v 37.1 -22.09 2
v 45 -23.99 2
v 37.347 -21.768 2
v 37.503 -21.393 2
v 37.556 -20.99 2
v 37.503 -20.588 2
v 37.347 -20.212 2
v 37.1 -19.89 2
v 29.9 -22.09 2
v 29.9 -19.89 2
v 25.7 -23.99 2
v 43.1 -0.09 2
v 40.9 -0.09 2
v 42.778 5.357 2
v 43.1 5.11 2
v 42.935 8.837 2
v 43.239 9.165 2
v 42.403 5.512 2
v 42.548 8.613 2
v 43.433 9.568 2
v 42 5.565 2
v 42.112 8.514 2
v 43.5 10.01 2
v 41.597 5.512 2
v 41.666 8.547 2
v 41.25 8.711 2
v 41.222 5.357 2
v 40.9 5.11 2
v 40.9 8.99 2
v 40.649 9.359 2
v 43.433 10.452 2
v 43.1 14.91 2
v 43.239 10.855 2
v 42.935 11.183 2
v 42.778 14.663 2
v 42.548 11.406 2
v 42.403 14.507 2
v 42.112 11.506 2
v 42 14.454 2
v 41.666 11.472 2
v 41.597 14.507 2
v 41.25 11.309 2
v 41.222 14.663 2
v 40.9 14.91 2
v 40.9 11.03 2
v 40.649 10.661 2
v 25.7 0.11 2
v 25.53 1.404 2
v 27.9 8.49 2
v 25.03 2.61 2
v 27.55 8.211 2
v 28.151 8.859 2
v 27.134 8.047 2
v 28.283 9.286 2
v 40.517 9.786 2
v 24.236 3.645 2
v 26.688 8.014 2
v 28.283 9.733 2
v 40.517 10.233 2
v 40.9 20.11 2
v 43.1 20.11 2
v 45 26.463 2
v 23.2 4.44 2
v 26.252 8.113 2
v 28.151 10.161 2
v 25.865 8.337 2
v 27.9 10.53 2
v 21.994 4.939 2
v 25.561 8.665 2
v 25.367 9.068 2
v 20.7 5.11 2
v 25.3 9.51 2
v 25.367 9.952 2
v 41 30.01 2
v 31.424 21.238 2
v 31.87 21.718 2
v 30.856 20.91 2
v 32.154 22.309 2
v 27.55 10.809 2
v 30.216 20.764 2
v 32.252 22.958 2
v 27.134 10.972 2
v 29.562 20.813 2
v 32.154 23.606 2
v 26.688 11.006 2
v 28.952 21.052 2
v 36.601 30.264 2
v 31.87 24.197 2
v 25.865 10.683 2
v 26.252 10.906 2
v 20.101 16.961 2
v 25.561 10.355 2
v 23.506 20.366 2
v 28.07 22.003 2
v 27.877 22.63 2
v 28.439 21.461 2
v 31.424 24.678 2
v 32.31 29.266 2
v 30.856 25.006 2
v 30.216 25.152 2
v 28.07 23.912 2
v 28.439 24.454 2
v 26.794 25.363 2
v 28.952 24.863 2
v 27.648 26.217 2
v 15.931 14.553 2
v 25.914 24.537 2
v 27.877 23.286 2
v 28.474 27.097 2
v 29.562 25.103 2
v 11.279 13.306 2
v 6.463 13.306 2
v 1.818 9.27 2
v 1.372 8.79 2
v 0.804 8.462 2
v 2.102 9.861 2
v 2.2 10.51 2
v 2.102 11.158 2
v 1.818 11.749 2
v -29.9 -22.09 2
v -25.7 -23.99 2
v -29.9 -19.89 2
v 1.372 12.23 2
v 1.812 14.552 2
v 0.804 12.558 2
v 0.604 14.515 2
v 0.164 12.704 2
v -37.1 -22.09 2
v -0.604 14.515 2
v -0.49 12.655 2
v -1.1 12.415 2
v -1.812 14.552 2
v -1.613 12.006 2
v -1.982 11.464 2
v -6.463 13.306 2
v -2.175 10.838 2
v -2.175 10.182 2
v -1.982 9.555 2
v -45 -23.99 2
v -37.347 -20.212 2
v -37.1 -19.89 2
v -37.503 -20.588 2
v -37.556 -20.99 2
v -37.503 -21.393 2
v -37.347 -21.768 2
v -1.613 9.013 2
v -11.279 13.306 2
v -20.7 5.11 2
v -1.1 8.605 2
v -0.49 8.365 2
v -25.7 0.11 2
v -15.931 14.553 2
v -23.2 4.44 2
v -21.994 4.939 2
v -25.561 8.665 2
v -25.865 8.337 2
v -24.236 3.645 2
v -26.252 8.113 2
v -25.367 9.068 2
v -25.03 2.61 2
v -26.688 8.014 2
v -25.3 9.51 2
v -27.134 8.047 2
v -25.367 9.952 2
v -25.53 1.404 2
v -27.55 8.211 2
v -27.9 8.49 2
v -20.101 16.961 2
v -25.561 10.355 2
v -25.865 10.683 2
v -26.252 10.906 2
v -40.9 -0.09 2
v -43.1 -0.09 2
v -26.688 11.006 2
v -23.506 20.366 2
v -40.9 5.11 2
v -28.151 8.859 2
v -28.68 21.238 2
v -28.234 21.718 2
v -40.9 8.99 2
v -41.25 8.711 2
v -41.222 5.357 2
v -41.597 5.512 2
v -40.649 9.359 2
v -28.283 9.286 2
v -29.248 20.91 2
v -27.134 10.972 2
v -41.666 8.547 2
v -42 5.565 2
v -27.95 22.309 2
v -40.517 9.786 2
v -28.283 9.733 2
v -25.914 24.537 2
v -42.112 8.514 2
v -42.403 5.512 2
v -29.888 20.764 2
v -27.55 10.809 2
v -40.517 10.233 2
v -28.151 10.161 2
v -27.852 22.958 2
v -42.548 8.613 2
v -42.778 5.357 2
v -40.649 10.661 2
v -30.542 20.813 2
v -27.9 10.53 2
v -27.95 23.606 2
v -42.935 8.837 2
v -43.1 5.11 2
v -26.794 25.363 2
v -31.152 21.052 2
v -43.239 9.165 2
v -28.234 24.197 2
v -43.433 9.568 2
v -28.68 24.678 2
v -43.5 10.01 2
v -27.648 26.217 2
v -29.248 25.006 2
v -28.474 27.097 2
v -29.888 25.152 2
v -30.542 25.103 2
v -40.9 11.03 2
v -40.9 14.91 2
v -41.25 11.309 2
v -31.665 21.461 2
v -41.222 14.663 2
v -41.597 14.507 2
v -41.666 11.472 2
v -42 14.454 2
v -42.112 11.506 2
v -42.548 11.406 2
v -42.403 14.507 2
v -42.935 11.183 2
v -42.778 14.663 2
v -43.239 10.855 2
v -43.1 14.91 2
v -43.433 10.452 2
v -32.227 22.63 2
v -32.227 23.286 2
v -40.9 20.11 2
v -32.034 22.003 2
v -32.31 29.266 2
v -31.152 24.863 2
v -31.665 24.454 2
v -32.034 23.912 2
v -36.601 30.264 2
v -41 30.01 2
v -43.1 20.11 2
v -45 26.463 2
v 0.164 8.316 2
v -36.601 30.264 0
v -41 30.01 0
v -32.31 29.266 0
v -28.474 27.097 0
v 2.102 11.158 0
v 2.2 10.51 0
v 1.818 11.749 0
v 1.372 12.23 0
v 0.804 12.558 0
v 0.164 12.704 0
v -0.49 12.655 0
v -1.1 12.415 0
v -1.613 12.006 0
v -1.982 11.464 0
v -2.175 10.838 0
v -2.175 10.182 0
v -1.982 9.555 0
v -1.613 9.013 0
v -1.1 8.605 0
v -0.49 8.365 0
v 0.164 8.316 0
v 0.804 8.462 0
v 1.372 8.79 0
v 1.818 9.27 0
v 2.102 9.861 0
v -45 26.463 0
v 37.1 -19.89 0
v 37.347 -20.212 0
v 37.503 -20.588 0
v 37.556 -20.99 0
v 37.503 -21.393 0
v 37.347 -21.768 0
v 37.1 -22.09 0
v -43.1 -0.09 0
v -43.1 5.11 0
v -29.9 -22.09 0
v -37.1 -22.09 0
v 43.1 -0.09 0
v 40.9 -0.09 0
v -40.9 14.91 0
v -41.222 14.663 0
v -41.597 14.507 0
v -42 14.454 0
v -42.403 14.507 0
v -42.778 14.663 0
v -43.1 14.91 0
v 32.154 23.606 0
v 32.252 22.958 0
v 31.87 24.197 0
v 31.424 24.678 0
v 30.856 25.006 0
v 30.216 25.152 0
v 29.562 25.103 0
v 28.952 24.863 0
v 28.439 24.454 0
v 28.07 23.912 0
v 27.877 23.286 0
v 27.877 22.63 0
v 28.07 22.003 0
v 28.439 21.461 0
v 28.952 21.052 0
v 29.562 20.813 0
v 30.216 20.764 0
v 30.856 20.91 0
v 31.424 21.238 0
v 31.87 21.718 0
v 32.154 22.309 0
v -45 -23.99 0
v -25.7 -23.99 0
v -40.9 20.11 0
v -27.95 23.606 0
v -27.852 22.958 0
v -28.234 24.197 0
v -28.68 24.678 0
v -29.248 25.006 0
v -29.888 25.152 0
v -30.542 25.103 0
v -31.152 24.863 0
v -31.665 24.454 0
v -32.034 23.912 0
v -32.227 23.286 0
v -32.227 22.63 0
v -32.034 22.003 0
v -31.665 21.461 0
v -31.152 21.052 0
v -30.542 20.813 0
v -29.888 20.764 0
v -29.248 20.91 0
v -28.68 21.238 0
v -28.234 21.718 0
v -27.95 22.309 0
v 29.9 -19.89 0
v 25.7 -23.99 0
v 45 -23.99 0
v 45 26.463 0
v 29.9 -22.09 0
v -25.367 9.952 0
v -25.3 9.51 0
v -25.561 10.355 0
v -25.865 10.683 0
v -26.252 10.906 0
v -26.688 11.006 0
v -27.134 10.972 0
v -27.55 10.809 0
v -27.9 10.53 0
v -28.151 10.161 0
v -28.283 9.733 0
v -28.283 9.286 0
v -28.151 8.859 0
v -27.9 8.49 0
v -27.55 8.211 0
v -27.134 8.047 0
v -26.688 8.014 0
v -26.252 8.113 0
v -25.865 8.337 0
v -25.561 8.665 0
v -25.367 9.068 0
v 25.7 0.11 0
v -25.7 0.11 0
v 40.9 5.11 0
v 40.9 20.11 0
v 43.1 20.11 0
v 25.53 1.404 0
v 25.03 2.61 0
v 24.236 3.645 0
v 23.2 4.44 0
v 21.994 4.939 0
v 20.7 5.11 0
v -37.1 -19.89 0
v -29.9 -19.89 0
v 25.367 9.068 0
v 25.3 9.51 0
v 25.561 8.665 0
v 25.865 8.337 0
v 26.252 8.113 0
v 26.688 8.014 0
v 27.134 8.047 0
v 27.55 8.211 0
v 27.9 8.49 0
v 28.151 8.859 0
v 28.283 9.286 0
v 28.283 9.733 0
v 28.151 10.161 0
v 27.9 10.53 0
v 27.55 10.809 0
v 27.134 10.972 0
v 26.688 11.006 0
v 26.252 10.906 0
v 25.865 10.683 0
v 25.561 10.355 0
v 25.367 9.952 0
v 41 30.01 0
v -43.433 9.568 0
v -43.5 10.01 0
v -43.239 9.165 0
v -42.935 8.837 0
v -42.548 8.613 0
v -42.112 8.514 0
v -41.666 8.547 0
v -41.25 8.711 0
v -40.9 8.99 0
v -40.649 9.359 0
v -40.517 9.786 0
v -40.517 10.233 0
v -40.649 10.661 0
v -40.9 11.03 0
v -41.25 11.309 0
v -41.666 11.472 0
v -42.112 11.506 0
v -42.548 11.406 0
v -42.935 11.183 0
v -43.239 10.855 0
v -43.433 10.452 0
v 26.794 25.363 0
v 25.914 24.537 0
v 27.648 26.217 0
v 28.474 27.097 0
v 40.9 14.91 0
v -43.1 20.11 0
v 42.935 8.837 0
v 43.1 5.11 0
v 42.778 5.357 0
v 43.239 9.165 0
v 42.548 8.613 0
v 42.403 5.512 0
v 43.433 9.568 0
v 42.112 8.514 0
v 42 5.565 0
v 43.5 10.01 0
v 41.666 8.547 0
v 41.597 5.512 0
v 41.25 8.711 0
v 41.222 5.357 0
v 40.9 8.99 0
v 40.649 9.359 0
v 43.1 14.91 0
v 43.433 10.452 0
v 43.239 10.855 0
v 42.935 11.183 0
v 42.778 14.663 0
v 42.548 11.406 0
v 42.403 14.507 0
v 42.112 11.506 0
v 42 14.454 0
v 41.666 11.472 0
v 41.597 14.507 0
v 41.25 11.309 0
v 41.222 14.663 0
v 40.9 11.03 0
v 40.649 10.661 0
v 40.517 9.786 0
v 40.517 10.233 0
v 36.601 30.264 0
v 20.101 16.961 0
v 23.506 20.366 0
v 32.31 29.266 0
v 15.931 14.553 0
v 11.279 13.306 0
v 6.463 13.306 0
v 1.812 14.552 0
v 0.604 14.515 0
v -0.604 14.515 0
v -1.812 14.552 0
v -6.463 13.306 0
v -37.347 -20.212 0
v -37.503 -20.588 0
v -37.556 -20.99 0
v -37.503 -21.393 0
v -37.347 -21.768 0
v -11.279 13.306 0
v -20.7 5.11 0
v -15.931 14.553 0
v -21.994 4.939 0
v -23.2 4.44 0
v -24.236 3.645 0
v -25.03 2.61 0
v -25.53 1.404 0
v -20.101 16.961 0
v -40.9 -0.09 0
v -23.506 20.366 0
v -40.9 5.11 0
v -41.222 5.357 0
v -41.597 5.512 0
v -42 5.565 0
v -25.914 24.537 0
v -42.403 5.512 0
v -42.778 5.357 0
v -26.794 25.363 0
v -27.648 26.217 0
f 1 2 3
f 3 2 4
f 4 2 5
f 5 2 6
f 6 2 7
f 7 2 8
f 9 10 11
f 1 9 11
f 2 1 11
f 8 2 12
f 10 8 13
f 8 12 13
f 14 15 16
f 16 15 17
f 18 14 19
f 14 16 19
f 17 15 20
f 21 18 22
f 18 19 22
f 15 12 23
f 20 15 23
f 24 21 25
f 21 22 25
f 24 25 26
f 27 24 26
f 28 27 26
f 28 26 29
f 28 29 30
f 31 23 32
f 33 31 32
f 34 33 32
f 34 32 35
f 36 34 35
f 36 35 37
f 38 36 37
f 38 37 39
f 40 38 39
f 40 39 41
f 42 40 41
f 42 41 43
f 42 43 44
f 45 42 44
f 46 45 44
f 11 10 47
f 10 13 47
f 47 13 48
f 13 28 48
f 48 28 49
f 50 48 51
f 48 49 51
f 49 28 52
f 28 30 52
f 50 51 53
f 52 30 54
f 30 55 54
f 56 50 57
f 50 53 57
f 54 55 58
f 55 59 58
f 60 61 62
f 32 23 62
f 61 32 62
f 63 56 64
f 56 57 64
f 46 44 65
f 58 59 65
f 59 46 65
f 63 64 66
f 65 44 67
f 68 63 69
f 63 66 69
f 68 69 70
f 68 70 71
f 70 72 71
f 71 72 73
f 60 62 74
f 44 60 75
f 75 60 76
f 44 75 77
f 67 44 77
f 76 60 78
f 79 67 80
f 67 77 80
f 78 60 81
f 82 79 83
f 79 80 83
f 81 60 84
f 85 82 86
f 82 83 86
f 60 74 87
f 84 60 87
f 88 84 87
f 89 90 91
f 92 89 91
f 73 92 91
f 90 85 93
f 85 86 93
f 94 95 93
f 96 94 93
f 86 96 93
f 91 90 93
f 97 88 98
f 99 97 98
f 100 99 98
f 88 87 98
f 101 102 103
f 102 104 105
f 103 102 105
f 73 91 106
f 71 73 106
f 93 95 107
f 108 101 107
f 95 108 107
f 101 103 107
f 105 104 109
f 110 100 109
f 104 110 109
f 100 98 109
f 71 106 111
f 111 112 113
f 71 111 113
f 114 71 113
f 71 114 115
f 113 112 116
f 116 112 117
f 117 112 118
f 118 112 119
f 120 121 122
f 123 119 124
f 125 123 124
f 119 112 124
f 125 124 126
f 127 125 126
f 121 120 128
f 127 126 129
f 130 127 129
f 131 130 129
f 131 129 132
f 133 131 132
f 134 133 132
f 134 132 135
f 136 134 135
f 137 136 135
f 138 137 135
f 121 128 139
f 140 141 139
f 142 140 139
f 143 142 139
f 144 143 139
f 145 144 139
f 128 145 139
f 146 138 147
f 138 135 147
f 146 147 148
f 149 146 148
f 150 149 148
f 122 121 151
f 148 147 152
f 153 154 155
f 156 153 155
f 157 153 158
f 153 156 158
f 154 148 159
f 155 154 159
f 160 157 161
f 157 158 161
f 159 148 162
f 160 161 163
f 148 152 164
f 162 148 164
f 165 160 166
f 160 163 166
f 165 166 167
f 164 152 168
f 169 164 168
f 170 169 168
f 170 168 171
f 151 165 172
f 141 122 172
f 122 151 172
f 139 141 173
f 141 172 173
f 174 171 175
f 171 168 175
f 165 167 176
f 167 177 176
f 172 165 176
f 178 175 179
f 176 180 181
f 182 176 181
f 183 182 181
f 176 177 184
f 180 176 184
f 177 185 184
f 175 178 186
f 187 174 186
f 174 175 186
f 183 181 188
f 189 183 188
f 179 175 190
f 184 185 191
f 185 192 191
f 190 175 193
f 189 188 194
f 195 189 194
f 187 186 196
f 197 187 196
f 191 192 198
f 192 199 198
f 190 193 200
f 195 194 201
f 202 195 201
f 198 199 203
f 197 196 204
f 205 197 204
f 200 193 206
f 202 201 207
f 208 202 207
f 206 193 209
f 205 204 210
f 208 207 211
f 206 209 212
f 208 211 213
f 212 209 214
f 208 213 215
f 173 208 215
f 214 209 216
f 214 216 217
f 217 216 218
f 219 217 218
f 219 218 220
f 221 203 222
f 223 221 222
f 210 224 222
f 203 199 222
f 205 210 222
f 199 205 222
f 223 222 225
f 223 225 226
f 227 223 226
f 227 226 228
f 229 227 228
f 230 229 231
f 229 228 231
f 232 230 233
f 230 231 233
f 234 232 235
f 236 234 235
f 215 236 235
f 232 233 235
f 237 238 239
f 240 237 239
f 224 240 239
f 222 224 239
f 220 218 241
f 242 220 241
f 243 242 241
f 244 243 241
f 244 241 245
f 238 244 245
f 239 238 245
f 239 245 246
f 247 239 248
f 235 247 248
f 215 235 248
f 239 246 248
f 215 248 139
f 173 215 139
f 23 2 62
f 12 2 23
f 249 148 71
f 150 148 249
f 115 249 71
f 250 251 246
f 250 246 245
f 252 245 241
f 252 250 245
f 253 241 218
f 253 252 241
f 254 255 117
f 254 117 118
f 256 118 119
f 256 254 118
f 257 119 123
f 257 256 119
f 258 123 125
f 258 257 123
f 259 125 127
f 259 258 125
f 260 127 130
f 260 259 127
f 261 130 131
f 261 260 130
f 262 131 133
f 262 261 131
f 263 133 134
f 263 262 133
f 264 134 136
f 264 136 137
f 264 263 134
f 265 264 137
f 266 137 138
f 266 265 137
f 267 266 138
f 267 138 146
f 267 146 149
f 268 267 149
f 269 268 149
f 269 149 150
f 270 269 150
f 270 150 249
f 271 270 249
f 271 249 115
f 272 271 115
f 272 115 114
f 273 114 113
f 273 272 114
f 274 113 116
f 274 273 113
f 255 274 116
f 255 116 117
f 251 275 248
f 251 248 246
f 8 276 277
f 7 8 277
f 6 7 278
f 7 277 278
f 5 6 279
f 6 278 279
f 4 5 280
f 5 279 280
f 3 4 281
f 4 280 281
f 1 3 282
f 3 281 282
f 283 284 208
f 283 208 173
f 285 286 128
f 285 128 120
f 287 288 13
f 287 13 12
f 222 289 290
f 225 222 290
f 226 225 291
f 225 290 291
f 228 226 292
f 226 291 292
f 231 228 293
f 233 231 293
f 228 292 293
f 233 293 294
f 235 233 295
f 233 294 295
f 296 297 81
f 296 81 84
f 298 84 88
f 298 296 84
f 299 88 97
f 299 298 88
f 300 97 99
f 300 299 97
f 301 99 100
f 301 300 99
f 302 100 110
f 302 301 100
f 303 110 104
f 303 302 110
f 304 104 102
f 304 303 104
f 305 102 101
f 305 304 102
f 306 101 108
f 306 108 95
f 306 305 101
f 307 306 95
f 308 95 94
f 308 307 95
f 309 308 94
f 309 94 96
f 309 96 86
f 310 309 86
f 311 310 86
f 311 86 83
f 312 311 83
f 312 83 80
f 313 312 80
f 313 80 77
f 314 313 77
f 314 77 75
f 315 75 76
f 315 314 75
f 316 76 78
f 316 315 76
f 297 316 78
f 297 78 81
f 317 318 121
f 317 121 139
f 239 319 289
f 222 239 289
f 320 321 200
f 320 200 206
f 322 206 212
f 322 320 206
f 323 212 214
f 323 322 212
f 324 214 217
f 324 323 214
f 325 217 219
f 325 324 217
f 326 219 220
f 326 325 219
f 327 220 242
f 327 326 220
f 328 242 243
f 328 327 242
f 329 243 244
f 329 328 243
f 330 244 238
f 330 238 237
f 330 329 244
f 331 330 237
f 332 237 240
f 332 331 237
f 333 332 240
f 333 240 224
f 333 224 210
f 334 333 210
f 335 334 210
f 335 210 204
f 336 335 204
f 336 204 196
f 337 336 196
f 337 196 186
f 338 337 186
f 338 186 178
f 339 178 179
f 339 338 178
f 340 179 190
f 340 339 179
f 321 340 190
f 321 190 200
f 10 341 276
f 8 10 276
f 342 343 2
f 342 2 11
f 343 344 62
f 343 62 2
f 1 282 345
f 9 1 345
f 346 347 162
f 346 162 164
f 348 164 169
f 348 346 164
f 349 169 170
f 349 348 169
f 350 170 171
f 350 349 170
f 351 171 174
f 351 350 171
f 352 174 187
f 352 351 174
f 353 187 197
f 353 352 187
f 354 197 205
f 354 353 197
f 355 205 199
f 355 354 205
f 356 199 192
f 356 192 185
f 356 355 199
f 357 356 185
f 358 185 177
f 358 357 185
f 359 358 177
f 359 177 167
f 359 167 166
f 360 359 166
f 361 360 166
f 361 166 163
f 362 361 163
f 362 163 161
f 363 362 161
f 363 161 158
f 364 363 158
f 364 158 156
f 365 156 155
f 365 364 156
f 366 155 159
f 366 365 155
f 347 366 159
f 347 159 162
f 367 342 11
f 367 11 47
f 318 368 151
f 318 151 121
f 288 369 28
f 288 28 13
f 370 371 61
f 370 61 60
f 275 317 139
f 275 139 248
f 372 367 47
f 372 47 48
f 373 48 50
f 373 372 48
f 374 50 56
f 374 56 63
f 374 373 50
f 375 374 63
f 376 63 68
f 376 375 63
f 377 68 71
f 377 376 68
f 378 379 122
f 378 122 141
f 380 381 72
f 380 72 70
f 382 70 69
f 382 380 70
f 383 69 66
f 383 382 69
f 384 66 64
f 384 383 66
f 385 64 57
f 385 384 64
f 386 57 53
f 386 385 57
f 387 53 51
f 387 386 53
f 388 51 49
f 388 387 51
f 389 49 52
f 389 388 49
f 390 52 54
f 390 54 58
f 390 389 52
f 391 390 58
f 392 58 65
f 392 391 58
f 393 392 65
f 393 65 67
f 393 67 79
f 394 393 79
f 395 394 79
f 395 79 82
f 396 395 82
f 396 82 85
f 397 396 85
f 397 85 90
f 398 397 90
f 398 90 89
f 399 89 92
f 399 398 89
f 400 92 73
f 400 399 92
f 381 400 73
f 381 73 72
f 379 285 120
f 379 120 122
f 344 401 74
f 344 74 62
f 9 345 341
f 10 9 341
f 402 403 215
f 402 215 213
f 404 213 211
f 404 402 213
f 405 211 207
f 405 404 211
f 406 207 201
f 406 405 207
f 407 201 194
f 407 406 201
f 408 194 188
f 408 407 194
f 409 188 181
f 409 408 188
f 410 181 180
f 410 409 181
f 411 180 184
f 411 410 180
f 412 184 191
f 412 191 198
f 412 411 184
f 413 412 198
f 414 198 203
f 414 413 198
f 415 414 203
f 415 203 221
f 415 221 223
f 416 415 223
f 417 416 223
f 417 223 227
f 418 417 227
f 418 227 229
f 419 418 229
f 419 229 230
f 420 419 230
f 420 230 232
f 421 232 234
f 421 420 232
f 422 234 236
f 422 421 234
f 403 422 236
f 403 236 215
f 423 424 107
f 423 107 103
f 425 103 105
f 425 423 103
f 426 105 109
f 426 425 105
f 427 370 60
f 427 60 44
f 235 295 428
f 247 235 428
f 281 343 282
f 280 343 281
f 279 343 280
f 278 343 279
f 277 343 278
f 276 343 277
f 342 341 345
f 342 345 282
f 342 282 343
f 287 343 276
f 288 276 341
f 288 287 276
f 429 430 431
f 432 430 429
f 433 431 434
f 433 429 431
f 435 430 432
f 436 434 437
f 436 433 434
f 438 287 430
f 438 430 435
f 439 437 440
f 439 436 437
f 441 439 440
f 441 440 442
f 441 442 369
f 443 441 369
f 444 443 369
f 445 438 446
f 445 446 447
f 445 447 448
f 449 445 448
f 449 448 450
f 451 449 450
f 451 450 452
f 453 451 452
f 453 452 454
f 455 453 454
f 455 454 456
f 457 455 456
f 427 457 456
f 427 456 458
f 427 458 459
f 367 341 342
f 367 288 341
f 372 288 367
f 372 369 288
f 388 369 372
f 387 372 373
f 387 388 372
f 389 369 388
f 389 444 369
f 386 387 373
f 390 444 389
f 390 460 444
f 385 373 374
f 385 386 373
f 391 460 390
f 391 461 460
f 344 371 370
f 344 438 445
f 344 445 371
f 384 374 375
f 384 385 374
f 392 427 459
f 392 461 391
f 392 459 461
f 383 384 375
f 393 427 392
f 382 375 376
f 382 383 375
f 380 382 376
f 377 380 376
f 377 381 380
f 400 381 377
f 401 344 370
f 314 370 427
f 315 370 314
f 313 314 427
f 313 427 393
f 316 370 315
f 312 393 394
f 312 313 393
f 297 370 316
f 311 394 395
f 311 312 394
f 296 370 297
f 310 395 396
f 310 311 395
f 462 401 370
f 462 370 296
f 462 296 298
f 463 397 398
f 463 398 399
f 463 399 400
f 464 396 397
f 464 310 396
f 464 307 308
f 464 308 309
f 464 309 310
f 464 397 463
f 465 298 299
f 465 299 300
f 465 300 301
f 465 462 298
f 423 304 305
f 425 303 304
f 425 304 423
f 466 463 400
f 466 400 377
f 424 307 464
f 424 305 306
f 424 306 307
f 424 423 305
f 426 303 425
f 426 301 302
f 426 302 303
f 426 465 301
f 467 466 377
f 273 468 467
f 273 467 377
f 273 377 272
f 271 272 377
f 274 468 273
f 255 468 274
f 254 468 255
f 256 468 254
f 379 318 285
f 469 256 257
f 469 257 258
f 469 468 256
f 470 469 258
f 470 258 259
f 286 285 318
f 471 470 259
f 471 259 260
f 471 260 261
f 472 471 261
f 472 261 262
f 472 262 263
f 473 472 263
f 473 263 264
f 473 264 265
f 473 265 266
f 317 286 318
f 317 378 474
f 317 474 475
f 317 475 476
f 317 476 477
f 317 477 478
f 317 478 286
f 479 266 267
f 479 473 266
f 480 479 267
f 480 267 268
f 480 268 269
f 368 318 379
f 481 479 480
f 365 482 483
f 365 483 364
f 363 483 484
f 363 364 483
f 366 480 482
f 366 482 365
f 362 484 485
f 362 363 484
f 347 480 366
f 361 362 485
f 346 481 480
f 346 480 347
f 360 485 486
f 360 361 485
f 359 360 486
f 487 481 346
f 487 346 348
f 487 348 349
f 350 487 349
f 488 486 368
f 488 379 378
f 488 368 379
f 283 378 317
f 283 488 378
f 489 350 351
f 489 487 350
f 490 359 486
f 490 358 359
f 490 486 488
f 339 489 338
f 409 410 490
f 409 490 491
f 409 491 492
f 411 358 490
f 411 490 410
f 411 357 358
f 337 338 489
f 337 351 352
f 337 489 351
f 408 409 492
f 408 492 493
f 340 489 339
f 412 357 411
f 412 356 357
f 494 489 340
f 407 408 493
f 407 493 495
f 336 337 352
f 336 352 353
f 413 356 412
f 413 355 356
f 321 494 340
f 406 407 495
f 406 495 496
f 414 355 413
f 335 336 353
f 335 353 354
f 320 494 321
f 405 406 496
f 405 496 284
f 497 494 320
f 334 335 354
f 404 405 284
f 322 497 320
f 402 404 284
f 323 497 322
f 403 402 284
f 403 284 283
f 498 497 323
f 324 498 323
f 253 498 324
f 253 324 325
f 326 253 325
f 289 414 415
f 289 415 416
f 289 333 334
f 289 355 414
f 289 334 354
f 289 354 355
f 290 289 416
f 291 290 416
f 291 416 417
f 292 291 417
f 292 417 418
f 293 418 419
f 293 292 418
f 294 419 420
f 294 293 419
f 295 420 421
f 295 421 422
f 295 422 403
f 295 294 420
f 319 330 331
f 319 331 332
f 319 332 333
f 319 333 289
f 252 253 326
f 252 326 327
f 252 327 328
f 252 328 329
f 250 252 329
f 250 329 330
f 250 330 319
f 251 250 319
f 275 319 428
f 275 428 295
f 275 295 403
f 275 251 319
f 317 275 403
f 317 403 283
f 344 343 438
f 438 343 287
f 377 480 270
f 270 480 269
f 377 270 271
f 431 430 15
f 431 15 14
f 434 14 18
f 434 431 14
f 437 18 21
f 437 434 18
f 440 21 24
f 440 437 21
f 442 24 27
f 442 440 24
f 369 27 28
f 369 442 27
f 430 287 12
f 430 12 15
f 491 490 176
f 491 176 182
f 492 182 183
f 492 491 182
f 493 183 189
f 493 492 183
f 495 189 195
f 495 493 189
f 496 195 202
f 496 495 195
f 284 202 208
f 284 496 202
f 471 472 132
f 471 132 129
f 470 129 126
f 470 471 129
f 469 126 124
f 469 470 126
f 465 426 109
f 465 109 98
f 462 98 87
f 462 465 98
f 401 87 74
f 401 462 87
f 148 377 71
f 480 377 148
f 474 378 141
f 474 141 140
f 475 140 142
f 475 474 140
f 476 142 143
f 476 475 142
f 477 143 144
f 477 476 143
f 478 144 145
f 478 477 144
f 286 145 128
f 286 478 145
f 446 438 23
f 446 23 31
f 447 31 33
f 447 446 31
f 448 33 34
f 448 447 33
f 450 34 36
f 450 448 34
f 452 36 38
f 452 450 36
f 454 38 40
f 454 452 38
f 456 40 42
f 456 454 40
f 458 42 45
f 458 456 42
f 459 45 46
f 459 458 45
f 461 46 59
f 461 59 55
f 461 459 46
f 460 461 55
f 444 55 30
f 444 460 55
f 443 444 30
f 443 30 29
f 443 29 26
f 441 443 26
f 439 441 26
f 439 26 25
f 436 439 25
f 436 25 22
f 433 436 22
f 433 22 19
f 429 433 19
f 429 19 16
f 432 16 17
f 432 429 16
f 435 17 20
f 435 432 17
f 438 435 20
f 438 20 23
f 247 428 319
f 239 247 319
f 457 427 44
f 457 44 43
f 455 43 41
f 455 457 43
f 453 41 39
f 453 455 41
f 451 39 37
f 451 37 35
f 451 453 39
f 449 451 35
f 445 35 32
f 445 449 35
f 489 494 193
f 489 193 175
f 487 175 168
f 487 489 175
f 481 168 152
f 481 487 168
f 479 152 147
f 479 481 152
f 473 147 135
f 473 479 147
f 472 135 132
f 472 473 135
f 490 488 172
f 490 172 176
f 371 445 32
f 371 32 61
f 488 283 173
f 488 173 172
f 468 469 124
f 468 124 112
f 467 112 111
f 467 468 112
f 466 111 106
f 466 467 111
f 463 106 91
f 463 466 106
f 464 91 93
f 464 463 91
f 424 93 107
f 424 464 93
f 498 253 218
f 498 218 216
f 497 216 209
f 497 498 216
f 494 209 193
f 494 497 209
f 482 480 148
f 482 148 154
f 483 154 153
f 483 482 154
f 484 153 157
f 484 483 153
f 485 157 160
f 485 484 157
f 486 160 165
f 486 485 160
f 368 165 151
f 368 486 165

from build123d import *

# Parameters (mm, degrees)
SKETCH_3_R      = 2.2
SKETCH_3_R_2    = 1.5
EXTRUDE_1_DEPTH = 2


with BuildPart() as part:
    # 草图3 → 凸台-拉伸1 (new body)
    with BuildSketch(Plane.XY):
        with BuildLine():
            Line((-41, -23.990216685), (-42, -23.990216685))
            Line((-42, -23.990216685), (-44, -23.990216685))
            Line((-44, -23.990216685), (-45, -23.990216685))
            Line((-45, -23.990216685), (-45, 5.009783315))
            Line((-45, 5.009783315), (-45, 15.009783315))
            Line((-45, 15.009783315), (-45, 26.463053661))
            Line((-45, 26.463053661), (-41, 30.009783315))
            ThreePointArc((-41, 30.009783315), (-34.419700625, 29.918417102), (-28.474223323, 27.097072158))
            ThreePointArc((-28.474223323, 27.097072158), (-27.224142294, 25.7867036), (-25.913822519, 24.536571436))
            ThreePointArc((-25.913822519, 24.536571436), (-15.930575575, 14.55280442), (-1.811764604, 14.552436852))
            ThreePointArc((-1.811764604, 14.552436852), (0, 14.509783471), (1.811764604, 14.552436852))
            ThreePointArc((1.811764604, 14.552436852), (15.930575575, 14.55280442), (25.913822519, 24.536571436))
            ThreePointArc((25.913822519, 24.536571436), (27.224142294, 25.7867036), (28.474223323, 27.097072158))
            ThreePointArc((28.474223323, 27.097072158), (34.419700625, 29.918417102), (41, 30.009783315))
            Line((41, 30.009783315), (45, 26.463053661))
            Line((45, 26.463053661), (45, 15.009783315))
            Line((45, 15.009783315), (45, -23.990216685))
            Line((45, -23.990216685), (41, -23.990216685))
            Line((41, -23.990216685), (25.7, -23.990216685))
            Line((25.7, -23.990216685), (25.7, -19.890216685))
            Line((25.7, -19.890216685), (25.7, -18.890216685))
            Line((25.7, -18.890216685), (25.7, 0.109783315))
            ThreePointArc((25.7, 0.109783315), (24.235533906, 3.645317221), (20.7, 5.109783315))
            Line((20.7, 5.109783315), (-20.7, 5.109783315))
            ThreePointArc((-20.7, 5.109783315), (-24.235533906, 3.645317221), (-25.7, 0.109783315))
            Line((-25.7, 0.109783315), (-25.7, -18.890216685))
            Line((-25.7, -18.890216685), (-25.7, -19.890216685))
            Line((-25.7, -19.890216685), (-25.7, -23.990216685))
            Line((-25.7, -23.990216685), (-41, -23.990216685))
        make_face()
        with Locations((0, 10.509783315)):
            Circle(SKETCH_3_R, mode=Mode.SUBTRACT)
        with Locations((-30.0520382, 22.957745114)):
            Circle(SKETCH_3_R, mode=Mode.SUBTRACT)
        with Locations((30.0520382, 22.957745114)):
            Circle(SKETCH_3_R, mode=Mode.SUBTRACT)
        with Locations((-26.8, 9.509783315)):
            Circle(SKETCH_3_R_2, mode=Mode.SUBTRACT)
        with Locations(Location((26.8, 9.509783315, 0), (0, 0, 180))):
            Circle(SKETCH_3_R_2, mode=Mode.SUBTRACT)
        with Locations((42, 10.009783315)):
            Circle(SKETCH_3_R_2, mode=Mode.SUBTRACT)
        with Locations(Location((-42, 10.009783315, 0), (0, 0, 180))):
            Circle(SKETCH_3_R_2, mode=Mode.SUBTRACT)
        with BuildLine():
            Line((-37.1, -22.090216685), (-29.9, -22.090216685))
            Line((-29.9, -22.090216685), (-29.9, -19.890216685))
            Line((-29.9, -19.890216685), (-37.1, -19.890216685))
            ThreePointArc((-37.1, -19.890216685), (-37.555634919, -20.990216685), (-37.1, -22.090216685))
        make_face(mode=Mode.SUBTRACT)
        with BuildLine():
            Line((29.9, -22.090216685), (29.9, -19.890216685))
            Line((29.9, -19.890216685), (37.1, -19.890216685))
            ThreePointArc((37.1, -19.890216685), (37.555634919, -20.990216685), (37.1, -22.090216685))
            Line((37.1, -22.090216685), (29.9, -22.090216685))
        make_face(mode=Mode.SUBTRACT)
        with BuildLine():
            Line((-43.1, 5.109783315), (-43.1, -0.090216685))
            Line((-43.1, -0.090216685), (-40.9, -0.090216685))
            Line((-40.9, -0.090216685), (-40.9, 5.109783315))
            ThreePointArc((-40.9, 5.109783315), (-42, 5.565418233), (-43.1, 5.109783315))
        make_face(mode=Mode.SUBTRACT)
        with BuildLine():
            Line((-43.1, 20.109783315), (-40.9, 20.109783315))
            Line((-40.9, 20.109783315), (-40.9, 14.909783315))
            ThreePointArc((-40.9, 14.909783315), (-42, 14.454148396), (-43.1, 14.909783315))
            Line((-43.1, 14.909783315), (-43.1, 20.109783315))
        make_face(mode=Mode.SUBTRACT)
        with BuildLine():
            Line((40.9, 20.109783315), (40.9, 14.909783315))
            ThreePointArc((40.9, 14.909783315), (42, 14.454148396), (43.1, 14.909783315))
            Line((43.1, 14.909783315), (43.1, 20.109783315))
            Line((43.1, 20.109783315), (40.9, 20.109783315))
        make_face(mode=Mode.SUBTRACT)
        with BuildLine():
            Line((40.9, 5.109783315), (40.9, -0.090216685))
            Line((40.9, -0.090216685), (43.1, -0.090216685))
            Line((43.1, -0.090216685), (43.1, 5.109783315))
            ThreePointArc((43.1, 5.109783315), (42, 5.565418233), (40.9, 5.109783315))
        make_face(mode=Mode.SUBTRACT)
    extrude(amount=EXTRUDE_1_DEPTH)


solid = part.part
